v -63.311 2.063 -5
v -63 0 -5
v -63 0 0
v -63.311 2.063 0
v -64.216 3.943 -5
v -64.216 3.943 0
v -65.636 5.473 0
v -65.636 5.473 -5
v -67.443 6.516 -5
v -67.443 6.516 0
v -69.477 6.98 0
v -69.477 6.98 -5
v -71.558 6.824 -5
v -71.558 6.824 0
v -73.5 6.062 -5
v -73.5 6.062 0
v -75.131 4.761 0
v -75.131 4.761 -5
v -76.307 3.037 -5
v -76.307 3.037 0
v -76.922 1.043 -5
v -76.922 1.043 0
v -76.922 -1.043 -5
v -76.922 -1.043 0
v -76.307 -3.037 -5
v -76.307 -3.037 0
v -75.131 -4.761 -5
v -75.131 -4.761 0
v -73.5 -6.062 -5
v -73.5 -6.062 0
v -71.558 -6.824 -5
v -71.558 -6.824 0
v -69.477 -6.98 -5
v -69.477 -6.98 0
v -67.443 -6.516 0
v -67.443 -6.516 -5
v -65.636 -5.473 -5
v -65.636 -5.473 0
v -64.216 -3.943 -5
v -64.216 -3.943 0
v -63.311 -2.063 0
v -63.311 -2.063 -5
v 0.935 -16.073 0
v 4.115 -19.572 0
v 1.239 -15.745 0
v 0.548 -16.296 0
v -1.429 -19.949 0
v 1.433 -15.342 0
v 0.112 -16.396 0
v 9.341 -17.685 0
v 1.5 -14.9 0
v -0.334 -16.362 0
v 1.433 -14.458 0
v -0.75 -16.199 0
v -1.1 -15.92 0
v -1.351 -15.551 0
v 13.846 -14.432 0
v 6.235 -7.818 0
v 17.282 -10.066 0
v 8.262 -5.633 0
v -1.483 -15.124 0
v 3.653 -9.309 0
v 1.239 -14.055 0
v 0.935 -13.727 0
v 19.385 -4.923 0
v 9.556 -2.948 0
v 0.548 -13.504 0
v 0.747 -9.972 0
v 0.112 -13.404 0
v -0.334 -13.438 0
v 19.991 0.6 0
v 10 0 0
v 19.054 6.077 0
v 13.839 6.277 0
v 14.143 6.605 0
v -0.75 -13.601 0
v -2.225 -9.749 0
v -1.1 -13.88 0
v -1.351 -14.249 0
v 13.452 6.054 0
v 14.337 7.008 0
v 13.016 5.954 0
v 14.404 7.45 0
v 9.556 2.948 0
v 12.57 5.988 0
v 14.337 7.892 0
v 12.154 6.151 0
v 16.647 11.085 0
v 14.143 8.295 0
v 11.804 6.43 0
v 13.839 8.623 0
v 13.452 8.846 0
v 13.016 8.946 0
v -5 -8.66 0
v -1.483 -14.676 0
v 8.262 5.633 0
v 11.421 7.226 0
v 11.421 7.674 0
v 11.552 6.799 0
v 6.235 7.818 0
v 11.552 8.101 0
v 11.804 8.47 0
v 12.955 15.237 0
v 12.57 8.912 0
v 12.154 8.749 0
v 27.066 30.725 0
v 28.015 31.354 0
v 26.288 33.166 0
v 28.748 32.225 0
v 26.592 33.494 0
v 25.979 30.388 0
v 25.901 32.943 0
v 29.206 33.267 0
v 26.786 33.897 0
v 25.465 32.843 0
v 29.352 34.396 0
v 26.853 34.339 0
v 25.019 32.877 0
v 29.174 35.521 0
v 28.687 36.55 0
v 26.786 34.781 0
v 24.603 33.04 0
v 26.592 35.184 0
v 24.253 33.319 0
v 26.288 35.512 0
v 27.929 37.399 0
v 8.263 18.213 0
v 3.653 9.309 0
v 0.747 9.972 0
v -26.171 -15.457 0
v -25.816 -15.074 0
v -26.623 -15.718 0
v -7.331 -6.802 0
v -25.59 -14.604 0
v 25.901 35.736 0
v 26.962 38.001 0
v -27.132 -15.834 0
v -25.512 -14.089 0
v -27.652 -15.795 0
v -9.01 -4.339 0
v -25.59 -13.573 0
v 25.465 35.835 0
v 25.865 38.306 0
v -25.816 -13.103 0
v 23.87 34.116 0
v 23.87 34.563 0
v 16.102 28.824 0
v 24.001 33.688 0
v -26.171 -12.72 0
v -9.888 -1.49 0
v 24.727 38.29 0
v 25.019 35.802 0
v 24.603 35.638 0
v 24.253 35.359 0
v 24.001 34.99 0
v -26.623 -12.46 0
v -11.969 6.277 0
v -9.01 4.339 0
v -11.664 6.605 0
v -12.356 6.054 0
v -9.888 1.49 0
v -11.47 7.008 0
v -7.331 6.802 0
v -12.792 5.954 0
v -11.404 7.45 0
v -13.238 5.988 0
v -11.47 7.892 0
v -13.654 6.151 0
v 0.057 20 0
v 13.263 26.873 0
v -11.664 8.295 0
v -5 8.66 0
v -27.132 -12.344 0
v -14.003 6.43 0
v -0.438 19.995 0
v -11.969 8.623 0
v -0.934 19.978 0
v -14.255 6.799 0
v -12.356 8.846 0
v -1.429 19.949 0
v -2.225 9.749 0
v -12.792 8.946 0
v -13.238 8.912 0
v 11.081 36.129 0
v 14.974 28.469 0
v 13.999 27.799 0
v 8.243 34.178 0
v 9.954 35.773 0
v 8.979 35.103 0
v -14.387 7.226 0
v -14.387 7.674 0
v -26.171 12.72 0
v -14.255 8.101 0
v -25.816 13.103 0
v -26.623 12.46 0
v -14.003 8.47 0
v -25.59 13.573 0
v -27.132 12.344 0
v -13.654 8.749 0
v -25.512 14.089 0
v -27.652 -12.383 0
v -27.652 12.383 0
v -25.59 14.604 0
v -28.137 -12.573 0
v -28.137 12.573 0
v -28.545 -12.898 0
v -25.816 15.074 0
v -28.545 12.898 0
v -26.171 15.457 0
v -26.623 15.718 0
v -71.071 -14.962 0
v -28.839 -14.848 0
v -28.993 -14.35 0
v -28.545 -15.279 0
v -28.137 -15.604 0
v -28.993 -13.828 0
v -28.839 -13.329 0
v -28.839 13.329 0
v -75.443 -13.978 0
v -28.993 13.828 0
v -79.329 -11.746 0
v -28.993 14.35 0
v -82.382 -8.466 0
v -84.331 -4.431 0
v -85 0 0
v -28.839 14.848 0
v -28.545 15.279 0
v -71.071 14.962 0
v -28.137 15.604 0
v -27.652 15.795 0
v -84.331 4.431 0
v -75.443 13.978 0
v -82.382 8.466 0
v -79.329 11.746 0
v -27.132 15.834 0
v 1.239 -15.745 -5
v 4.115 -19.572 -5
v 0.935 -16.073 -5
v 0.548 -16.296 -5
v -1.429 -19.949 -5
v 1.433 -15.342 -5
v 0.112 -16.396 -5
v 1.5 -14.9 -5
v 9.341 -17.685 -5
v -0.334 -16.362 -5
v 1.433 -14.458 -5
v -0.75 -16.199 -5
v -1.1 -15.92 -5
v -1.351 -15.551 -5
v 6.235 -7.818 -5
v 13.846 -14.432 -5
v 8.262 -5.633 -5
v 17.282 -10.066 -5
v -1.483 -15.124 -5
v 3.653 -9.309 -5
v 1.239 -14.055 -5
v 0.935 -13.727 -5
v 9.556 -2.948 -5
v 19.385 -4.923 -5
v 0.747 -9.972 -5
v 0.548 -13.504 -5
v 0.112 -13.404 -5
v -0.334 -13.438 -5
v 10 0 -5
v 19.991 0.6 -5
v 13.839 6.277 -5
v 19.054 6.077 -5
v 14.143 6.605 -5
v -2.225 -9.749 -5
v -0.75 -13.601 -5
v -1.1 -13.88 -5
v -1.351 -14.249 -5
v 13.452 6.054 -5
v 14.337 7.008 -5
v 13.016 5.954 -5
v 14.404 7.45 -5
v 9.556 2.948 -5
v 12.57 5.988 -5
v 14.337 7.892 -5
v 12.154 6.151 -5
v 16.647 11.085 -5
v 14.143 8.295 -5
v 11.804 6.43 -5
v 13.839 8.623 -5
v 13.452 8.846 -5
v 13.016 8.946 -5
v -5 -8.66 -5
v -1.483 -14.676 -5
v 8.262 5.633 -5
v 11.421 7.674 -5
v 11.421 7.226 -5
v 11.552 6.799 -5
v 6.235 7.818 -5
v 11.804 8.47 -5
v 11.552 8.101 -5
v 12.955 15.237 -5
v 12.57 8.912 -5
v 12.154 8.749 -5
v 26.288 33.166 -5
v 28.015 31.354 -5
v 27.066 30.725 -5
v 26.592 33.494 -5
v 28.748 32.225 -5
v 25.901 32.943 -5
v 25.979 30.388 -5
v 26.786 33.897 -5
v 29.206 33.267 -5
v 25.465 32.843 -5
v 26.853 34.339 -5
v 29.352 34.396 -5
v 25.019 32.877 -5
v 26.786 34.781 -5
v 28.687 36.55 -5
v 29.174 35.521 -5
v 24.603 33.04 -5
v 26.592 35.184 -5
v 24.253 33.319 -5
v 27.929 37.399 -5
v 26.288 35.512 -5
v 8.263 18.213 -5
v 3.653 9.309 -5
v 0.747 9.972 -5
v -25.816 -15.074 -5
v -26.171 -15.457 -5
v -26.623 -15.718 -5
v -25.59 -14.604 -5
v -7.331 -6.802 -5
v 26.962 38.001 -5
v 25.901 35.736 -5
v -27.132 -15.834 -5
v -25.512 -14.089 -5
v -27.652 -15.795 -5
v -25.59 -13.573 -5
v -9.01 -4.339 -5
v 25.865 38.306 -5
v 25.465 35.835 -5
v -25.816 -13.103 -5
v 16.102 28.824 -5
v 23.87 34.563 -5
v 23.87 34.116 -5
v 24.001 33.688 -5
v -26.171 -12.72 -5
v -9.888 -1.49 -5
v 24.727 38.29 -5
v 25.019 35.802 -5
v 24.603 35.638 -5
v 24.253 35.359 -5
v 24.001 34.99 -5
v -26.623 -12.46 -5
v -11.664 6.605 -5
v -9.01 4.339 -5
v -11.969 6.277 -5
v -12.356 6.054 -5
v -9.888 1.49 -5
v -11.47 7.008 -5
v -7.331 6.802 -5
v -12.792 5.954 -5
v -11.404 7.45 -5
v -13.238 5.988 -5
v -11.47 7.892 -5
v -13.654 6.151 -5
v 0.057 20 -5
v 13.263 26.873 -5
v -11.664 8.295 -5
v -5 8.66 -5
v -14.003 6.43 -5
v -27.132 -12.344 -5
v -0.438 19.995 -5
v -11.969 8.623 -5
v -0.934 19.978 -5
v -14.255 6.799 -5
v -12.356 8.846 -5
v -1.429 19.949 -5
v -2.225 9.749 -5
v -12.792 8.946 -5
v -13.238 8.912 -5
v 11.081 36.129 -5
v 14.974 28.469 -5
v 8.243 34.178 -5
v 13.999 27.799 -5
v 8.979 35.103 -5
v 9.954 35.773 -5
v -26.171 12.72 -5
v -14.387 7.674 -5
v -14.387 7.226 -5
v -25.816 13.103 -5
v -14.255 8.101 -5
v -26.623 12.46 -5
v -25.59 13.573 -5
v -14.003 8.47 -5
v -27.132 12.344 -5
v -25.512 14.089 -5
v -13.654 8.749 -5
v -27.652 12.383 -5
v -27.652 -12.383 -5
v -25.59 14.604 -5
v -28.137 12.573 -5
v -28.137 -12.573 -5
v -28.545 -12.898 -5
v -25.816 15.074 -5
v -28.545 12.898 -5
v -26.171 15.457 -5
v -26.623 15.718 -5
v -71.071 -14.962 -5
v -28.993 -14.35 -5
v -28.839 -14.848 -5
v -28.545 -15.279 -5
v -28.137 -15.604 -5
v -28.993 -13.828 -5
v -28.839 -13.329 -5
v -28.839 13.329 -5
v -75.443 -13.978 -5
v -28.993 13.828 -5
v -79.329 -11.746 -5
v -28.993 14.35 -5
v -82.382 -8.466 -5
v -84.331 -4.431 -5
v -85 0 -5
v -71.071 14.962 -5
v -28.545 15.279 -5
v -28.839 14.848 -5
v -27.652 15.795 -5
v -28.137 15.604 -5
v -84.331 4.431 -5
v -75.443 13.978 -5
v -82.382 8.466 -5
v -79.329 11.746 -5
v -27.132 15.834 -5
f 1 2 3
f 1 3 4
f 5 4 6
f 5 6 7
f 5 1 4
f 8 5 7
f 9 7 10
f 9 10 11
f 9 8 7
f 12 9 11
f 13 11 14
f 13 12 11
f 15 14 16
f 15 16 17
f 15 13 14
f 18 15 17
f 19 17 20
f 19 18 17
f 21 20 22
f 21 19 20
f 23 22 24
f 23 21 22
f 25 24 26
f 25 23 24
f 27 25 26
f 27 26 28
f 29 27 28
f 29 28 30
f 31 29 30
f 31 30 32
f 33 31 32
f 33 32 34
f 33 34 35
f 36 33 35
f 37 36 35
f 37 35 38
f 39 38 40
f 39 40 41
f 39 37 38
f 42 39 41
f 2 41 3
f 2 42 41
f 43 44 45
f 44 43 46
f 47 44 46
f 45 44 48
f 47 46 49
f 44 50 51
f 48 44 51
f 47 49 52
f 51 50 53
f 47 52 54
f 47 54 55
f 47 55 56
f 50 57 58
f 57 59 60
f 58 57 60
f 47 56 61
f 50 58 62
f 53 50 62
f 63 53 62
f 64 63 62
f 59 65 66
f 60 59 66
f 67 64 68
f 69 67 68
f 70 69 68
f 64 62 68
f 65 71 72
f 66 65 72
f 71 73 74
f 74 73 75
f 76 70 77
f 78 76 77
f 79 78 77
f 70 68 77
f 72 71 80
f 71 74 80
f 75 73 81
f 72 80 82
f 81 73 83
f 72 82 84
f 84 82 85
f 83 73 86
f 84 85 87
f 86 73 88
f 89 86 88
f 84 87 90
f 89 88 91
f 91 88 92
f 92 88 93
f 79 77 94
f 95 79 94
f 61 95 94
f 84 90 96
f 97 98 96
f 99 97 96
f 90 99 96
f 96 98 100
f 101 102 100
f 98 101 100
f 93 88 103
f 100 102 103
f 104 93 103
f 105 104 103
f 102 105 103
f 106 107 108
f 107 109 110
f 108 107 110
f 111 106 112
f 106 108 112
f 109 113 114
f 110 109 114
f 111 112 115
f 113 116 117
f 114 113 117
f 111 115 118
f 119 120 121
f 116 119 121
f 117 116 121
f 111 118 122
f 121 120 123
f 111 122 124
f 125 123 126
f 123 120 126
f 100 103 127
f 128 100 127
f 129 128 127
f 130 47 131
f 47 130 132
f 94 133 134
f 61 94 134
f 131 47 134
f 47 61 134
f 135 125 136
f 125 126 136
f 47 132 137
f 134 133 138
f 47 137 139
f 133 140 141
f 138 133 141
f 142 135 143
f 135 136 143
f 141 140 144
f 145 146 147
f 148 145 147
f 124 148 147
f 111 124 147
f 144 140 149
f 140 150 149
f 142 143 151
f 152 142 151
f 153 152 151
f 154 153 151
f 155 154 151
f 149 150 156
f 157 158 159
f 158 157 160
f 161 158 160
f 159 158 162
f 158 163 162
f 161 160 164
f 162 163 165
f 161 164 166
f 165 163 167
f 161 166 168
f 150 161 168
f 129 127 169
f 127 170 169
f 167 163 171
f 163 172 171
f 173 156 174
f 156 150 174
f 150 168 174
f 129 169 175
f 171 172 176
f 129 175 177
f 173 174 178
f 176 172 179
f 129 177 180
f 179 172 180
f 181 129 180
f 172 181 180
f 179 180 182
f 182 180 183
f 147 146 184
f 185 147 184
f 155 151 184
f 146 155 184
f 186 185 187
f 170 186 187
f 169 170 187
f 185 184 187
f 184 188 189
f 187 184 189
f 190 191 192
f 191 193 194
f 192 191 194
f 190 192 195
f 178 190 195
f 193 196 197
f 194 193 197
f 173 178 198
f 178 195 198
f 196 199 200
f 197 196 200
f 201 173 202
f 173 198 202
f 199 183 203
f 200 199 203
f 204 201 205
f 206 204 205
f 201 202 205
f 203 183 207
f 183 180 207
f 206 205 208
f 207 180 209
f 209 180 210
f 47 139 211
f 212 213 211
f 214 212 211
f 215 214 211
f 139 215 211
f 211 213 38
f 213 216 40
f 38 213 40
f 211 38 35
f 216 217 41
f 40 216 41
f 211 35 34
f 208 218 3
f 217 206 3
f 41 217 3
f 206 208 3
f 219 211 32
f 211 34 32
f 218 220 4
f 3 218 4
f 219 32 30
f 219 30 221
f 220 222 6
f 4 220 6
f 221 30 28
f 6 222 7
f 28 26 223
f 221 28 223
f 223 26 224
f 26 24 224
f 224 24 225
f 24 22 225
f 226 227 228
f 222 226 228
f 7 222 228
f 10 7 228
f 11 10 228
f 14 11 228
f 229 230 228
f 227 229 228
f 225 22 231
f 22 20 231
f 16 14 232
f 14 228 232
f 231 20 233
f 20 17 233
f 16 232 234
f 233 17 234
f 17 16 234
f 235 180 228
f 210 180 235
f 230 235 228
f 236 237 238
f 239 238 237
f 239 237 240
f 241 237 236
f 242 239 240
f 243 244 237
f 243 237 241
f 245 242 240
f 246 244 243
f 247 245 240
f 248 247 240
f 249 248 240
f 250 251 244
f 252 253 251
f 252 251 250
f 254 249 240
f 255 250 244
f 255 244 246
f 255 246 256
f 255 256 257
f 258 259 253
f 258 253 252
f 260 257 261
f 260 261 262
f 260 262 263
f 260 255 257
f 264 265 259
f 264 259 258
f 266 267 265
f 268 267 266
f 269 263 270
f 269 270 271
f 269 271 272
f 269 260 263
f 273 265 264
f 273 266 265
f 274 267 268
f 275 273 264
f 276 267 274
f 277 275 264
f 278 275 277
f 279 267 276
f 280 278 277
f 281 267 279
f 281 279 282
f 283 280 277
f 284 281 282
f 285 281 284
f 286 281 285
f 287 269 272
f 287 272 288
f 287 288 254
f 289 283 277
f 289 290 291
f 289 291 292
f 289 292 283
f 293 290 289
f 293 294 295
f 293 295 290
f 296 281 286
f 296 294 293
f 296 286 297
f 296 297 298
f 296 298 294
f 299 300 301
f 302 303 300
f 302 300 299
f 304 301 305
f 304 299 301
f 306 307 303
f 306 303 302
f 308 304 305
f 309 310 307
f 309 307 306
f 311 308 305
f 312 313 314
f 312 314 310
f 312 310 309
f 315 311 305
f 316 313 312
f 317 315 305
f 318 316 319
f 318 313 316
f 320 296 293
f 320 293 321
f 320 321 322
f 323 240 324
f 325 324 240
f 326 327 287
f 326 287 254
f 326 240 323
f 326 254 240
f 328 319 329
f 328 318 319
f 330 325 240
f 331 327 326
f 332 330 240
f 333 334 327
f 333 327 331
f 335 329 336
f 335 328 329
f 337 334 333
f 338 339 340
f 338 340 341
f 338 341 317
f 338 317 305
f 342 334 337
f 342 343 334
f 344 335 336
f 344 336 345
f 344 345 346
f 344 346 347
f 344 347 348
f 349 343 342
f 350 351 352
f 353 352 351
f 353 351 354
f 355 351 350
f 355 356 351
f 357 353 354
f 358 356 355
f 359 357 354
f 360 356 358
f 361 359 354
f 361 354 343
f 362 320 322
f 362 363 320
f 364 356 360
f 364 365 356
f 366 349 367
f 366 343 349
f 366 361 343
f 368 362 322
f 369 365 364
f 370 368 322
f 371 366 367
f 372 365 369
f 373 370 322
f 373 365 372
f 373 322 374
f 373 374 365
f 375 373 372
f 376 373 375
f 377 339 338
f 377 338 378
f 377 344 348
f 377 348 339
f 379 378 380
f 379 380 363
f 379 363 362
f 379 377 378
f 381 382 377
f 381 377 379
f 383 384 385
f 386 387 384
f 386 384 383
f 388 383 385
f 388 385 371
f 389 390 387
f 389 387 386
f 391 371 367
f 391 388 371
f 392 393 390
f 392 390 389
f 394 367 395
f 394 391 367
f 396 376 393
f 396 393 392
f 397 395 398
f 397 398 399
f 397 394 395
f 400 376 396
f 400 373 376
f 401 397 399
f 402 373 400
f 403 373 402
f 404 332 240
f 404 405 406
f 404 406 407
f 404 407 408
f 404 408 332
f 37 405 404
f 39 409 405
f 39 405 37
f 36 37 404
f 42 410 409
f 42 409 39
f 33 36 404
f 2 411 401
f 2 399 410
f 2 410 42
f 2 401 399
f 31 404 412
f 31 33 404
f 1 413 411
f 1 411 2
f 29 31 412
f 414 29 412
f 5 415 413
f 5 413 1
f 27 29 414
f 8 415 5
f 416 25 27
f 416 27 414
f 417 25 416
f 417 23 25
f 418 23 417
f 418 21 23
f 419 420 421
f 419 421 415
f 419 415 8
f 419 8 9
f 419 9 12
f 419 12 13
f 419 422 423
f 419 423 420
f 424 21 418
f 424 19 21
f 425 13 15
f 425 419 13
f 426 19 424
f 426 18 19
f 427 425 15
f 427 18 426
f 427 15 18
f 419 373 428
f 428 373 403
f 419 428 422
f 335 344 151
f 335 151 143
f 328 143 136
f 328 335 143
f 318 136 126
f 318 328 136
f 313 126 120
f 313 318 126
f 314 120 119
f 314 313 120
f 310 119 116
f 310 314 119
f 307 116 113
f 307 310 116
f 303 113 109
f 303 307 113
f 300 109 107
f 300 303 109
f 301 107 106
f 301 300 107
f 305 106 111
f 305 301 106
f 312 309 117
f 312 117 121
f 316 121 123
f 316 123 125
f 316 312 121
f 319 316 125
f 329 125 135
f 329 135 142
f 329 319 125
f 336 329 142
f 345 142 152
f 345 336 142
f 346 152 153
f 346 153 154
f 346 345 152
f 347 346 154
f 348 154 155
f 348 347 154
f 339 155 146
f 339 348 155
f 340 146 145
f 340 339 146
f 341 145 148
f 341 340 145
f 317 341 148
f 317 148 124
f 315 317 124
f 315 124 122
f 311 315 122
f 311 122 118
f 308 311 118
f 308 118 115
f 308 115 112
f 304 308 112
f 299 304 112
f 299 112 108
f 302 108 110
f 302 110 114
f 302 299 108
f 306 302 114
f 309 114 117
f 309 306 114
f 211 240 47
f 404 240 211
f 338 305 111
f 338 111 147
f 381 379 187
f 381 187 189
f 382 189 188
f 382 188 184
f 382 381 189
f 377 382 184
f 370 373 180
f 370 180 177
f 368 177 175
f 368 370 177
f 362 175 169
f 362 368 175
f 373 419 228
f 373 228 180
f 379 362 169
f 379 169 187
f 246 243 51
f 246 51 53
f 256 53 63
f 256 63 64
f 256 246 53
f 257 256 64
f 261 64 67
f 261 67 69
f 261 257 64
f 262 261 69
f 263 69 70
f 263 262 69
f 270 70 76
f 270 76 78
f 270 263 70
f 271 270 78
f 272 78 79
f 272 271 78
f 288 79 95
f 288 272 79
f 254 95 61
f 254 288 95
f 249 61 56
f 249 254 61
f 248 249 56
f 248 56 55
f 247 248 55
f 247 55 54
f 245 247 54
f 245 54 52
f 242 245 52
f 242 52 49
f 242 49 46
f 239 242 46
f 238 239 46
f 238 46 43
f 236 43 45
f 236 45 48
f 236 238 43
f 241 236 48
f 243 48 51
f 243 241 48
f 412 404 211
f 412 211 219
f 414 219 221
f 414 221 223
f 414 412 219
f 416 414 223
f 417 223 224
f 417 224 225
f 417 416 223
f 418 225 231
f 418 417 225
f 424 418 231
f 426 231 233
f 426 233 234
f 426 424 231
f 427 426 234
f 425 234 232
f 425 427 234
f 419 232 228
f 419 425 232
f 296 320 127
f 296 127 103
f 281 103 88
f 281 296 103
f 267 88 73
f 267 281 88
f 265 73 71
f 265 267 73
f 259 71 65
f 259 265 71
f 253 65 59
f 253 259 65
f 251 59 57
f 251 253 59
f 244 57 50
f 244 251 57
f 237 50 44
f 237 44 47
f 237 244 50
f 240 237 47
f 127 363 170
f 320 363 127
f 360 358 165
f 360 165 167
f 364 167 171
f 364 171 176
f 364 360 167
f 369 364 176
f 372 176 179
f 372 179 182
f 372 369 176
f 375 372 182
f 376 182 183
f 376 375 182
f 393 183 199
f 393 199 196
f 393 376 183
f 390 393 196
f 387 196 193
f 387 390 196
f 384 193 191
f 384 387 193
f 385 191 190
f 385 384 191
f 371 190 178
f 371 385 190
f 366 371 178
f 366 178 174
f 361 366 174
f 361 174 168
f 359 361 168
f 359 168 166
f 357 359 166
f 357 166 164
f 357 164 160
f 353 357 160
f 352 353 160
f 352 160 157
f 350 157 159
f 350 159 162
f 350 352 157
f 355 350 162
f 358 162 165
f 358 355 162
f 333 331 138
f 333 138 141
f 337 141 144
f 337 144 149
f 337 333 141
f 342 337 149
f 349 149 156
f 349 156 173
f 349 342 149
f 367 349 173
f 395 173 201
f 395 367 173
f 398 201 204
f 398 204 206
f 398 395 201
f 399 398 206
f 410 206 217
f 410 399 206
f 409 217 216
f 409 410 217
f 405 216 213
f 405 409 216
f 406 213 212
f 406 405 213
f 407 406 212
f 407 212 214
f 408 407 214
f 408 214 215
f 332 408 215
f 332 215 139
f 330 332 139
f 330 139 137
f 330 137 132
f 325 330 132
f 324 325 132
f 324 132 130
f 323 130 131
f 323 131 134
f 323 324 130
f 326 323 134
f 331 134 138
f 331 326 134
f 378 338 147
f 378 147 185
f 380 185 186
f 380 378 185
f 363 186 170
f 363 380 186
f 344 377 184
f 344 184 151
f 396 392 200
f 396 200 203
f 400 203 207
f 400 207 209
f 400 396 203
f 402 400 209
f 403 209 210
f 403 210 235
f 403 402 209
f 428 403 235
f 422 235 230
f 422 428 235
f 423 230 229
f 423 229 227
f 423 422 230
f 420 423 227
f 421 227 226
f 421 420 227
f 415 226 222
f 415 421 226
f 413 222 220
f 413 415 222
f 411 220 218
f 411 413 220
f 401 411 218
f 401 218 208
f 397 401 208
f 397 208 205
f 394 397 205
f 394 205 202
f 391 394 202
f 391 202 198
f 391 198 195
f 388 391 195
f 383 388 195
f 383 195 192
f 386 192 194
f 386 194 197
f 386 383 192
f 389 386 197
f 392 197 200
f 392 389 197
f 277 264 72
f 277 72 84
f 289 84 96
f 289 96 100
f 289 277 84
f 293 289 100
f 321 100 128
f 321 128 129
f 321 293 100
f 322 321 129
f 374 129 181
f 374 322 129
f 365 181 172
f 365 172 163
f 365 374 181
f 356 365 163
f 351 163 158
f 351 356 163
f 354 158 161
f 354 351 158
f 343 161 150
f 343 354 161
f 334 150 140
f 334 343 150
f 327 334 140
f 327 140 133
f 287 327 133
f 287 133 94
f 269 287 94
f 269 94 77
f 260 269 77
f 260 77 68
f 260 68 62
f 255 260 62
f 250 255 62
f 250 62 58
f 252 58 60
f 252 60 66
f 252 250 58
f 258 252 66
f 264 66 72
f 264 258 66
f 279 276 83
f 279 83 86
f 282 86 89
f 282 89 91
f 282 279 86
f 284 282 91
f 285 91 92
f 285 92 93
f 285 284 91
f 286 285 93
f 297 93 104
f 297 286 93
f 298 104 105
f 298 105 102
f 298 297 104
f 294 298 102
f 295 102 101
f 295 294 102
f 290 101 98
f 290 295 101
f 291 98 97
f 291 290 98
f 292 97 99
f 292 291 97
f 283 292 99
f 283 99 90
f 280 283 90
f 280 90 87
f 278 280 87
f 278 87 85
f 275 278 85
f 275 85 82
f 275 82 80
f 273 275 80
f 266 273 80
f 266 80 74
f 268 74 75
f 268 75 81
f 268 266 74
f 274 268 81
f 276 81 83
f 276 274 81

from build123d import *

# Parameters (mm, degrees)
SKETCH1_R           = 7
SKETCH1_R_2         = 10
SKETCH1_R_3         = 1.5
SKETCH1_R_4         = 1.75
BOSS_EXTRUDE1_DEPTH = 5


with BuildPart() as part:
    # Sketch1 → Boss-Extrude1 (new body)
    with BuildSketch(Plane.XY):
        with BuildLine():
            Line((-71.071428571, 14.961685761), (-1.428571429, 19.948914348))
            ThreePointArc((-1.428571429, 19.948914348), (-0.686118829, 19.988227559), (0.057281956, 19.999917969))
            Line((0.057281956, 19.999917969), (8.242983117, 34.177968276))
            ThreePointArc((8.242983117, 34.177968276), (9.441459784, 35.47447303), (11.081346872, 36.128721638))
            Line((11.081346872, 36.128721638), (24.727055657, 38.289989587))
            ThreePointArc((24.727055657, 38.289989587), (29.30354688, 34.964974085), (25.978531377, 30.388482862))
            Line((25.978531377, 30.388482862), (16.101647971, 28.824138212))
            ThreePointArc((16.101647971, 28.824138212), (14.461760884, 28.169889604), (13.263284216, 26.873384849))
            Line((13.263284216, 26.873384849), (8.263284216, 18.213130812))
            ThreePointArc((8.263284216, 18.213130812), (19.384626574, -4.923032864), (-1.428571429, -19.948914348))
            Line((-1.428571429, -19.948914348), (-71.071428571, -14.961685761))
            ThreePointArc((-71.071428571, -14.961685761), (-85, 0), (-71.071428571, 14.961685761))
        make_face()
        with Locations((-70, 0)):
            Circle(SKETCH1_R, mode=Mode.SUBTRACT)
        Circle(SKETCH1_R_2, mode=Mode.SUBTRACT)
        with Locations((-12.903778516, 7.45)):
            Circle(SKETCH1_R_3, mode=Mode.SUBTRACT)
        with Locations((0, -14.9)):
            Circle(SKETCH1_R_3, mode=Mode.SUBTRACT)
        with Locations((-27.262321561, 14.088677781)):
            Circle(SKETCH1_R_4, mode=Mode.SUBTRACT)
        with Locations((-27.262321561, -14.088677781)):
            Circle(SKETCH1_R_4, mode=Mode.SUBTRACT)
        with Locations((12.903778516, 7.45)):
            Circle(SKETCH1_R_3, mode=Mode.SUBTRACT)
        with Locations((25.352793517, 34.339236225)):
            Circle(SKETCH1_R_3, mode=Mode.SUBTRACT)
    extrude(amount=BOSS_EXTRUDE1_DEPTH)


with BuildPart() as part_1:
    # Body-Move/Copy1: moved
    add(part.part.moved(Location((0, 0, -5))))


solid = part_1.part
